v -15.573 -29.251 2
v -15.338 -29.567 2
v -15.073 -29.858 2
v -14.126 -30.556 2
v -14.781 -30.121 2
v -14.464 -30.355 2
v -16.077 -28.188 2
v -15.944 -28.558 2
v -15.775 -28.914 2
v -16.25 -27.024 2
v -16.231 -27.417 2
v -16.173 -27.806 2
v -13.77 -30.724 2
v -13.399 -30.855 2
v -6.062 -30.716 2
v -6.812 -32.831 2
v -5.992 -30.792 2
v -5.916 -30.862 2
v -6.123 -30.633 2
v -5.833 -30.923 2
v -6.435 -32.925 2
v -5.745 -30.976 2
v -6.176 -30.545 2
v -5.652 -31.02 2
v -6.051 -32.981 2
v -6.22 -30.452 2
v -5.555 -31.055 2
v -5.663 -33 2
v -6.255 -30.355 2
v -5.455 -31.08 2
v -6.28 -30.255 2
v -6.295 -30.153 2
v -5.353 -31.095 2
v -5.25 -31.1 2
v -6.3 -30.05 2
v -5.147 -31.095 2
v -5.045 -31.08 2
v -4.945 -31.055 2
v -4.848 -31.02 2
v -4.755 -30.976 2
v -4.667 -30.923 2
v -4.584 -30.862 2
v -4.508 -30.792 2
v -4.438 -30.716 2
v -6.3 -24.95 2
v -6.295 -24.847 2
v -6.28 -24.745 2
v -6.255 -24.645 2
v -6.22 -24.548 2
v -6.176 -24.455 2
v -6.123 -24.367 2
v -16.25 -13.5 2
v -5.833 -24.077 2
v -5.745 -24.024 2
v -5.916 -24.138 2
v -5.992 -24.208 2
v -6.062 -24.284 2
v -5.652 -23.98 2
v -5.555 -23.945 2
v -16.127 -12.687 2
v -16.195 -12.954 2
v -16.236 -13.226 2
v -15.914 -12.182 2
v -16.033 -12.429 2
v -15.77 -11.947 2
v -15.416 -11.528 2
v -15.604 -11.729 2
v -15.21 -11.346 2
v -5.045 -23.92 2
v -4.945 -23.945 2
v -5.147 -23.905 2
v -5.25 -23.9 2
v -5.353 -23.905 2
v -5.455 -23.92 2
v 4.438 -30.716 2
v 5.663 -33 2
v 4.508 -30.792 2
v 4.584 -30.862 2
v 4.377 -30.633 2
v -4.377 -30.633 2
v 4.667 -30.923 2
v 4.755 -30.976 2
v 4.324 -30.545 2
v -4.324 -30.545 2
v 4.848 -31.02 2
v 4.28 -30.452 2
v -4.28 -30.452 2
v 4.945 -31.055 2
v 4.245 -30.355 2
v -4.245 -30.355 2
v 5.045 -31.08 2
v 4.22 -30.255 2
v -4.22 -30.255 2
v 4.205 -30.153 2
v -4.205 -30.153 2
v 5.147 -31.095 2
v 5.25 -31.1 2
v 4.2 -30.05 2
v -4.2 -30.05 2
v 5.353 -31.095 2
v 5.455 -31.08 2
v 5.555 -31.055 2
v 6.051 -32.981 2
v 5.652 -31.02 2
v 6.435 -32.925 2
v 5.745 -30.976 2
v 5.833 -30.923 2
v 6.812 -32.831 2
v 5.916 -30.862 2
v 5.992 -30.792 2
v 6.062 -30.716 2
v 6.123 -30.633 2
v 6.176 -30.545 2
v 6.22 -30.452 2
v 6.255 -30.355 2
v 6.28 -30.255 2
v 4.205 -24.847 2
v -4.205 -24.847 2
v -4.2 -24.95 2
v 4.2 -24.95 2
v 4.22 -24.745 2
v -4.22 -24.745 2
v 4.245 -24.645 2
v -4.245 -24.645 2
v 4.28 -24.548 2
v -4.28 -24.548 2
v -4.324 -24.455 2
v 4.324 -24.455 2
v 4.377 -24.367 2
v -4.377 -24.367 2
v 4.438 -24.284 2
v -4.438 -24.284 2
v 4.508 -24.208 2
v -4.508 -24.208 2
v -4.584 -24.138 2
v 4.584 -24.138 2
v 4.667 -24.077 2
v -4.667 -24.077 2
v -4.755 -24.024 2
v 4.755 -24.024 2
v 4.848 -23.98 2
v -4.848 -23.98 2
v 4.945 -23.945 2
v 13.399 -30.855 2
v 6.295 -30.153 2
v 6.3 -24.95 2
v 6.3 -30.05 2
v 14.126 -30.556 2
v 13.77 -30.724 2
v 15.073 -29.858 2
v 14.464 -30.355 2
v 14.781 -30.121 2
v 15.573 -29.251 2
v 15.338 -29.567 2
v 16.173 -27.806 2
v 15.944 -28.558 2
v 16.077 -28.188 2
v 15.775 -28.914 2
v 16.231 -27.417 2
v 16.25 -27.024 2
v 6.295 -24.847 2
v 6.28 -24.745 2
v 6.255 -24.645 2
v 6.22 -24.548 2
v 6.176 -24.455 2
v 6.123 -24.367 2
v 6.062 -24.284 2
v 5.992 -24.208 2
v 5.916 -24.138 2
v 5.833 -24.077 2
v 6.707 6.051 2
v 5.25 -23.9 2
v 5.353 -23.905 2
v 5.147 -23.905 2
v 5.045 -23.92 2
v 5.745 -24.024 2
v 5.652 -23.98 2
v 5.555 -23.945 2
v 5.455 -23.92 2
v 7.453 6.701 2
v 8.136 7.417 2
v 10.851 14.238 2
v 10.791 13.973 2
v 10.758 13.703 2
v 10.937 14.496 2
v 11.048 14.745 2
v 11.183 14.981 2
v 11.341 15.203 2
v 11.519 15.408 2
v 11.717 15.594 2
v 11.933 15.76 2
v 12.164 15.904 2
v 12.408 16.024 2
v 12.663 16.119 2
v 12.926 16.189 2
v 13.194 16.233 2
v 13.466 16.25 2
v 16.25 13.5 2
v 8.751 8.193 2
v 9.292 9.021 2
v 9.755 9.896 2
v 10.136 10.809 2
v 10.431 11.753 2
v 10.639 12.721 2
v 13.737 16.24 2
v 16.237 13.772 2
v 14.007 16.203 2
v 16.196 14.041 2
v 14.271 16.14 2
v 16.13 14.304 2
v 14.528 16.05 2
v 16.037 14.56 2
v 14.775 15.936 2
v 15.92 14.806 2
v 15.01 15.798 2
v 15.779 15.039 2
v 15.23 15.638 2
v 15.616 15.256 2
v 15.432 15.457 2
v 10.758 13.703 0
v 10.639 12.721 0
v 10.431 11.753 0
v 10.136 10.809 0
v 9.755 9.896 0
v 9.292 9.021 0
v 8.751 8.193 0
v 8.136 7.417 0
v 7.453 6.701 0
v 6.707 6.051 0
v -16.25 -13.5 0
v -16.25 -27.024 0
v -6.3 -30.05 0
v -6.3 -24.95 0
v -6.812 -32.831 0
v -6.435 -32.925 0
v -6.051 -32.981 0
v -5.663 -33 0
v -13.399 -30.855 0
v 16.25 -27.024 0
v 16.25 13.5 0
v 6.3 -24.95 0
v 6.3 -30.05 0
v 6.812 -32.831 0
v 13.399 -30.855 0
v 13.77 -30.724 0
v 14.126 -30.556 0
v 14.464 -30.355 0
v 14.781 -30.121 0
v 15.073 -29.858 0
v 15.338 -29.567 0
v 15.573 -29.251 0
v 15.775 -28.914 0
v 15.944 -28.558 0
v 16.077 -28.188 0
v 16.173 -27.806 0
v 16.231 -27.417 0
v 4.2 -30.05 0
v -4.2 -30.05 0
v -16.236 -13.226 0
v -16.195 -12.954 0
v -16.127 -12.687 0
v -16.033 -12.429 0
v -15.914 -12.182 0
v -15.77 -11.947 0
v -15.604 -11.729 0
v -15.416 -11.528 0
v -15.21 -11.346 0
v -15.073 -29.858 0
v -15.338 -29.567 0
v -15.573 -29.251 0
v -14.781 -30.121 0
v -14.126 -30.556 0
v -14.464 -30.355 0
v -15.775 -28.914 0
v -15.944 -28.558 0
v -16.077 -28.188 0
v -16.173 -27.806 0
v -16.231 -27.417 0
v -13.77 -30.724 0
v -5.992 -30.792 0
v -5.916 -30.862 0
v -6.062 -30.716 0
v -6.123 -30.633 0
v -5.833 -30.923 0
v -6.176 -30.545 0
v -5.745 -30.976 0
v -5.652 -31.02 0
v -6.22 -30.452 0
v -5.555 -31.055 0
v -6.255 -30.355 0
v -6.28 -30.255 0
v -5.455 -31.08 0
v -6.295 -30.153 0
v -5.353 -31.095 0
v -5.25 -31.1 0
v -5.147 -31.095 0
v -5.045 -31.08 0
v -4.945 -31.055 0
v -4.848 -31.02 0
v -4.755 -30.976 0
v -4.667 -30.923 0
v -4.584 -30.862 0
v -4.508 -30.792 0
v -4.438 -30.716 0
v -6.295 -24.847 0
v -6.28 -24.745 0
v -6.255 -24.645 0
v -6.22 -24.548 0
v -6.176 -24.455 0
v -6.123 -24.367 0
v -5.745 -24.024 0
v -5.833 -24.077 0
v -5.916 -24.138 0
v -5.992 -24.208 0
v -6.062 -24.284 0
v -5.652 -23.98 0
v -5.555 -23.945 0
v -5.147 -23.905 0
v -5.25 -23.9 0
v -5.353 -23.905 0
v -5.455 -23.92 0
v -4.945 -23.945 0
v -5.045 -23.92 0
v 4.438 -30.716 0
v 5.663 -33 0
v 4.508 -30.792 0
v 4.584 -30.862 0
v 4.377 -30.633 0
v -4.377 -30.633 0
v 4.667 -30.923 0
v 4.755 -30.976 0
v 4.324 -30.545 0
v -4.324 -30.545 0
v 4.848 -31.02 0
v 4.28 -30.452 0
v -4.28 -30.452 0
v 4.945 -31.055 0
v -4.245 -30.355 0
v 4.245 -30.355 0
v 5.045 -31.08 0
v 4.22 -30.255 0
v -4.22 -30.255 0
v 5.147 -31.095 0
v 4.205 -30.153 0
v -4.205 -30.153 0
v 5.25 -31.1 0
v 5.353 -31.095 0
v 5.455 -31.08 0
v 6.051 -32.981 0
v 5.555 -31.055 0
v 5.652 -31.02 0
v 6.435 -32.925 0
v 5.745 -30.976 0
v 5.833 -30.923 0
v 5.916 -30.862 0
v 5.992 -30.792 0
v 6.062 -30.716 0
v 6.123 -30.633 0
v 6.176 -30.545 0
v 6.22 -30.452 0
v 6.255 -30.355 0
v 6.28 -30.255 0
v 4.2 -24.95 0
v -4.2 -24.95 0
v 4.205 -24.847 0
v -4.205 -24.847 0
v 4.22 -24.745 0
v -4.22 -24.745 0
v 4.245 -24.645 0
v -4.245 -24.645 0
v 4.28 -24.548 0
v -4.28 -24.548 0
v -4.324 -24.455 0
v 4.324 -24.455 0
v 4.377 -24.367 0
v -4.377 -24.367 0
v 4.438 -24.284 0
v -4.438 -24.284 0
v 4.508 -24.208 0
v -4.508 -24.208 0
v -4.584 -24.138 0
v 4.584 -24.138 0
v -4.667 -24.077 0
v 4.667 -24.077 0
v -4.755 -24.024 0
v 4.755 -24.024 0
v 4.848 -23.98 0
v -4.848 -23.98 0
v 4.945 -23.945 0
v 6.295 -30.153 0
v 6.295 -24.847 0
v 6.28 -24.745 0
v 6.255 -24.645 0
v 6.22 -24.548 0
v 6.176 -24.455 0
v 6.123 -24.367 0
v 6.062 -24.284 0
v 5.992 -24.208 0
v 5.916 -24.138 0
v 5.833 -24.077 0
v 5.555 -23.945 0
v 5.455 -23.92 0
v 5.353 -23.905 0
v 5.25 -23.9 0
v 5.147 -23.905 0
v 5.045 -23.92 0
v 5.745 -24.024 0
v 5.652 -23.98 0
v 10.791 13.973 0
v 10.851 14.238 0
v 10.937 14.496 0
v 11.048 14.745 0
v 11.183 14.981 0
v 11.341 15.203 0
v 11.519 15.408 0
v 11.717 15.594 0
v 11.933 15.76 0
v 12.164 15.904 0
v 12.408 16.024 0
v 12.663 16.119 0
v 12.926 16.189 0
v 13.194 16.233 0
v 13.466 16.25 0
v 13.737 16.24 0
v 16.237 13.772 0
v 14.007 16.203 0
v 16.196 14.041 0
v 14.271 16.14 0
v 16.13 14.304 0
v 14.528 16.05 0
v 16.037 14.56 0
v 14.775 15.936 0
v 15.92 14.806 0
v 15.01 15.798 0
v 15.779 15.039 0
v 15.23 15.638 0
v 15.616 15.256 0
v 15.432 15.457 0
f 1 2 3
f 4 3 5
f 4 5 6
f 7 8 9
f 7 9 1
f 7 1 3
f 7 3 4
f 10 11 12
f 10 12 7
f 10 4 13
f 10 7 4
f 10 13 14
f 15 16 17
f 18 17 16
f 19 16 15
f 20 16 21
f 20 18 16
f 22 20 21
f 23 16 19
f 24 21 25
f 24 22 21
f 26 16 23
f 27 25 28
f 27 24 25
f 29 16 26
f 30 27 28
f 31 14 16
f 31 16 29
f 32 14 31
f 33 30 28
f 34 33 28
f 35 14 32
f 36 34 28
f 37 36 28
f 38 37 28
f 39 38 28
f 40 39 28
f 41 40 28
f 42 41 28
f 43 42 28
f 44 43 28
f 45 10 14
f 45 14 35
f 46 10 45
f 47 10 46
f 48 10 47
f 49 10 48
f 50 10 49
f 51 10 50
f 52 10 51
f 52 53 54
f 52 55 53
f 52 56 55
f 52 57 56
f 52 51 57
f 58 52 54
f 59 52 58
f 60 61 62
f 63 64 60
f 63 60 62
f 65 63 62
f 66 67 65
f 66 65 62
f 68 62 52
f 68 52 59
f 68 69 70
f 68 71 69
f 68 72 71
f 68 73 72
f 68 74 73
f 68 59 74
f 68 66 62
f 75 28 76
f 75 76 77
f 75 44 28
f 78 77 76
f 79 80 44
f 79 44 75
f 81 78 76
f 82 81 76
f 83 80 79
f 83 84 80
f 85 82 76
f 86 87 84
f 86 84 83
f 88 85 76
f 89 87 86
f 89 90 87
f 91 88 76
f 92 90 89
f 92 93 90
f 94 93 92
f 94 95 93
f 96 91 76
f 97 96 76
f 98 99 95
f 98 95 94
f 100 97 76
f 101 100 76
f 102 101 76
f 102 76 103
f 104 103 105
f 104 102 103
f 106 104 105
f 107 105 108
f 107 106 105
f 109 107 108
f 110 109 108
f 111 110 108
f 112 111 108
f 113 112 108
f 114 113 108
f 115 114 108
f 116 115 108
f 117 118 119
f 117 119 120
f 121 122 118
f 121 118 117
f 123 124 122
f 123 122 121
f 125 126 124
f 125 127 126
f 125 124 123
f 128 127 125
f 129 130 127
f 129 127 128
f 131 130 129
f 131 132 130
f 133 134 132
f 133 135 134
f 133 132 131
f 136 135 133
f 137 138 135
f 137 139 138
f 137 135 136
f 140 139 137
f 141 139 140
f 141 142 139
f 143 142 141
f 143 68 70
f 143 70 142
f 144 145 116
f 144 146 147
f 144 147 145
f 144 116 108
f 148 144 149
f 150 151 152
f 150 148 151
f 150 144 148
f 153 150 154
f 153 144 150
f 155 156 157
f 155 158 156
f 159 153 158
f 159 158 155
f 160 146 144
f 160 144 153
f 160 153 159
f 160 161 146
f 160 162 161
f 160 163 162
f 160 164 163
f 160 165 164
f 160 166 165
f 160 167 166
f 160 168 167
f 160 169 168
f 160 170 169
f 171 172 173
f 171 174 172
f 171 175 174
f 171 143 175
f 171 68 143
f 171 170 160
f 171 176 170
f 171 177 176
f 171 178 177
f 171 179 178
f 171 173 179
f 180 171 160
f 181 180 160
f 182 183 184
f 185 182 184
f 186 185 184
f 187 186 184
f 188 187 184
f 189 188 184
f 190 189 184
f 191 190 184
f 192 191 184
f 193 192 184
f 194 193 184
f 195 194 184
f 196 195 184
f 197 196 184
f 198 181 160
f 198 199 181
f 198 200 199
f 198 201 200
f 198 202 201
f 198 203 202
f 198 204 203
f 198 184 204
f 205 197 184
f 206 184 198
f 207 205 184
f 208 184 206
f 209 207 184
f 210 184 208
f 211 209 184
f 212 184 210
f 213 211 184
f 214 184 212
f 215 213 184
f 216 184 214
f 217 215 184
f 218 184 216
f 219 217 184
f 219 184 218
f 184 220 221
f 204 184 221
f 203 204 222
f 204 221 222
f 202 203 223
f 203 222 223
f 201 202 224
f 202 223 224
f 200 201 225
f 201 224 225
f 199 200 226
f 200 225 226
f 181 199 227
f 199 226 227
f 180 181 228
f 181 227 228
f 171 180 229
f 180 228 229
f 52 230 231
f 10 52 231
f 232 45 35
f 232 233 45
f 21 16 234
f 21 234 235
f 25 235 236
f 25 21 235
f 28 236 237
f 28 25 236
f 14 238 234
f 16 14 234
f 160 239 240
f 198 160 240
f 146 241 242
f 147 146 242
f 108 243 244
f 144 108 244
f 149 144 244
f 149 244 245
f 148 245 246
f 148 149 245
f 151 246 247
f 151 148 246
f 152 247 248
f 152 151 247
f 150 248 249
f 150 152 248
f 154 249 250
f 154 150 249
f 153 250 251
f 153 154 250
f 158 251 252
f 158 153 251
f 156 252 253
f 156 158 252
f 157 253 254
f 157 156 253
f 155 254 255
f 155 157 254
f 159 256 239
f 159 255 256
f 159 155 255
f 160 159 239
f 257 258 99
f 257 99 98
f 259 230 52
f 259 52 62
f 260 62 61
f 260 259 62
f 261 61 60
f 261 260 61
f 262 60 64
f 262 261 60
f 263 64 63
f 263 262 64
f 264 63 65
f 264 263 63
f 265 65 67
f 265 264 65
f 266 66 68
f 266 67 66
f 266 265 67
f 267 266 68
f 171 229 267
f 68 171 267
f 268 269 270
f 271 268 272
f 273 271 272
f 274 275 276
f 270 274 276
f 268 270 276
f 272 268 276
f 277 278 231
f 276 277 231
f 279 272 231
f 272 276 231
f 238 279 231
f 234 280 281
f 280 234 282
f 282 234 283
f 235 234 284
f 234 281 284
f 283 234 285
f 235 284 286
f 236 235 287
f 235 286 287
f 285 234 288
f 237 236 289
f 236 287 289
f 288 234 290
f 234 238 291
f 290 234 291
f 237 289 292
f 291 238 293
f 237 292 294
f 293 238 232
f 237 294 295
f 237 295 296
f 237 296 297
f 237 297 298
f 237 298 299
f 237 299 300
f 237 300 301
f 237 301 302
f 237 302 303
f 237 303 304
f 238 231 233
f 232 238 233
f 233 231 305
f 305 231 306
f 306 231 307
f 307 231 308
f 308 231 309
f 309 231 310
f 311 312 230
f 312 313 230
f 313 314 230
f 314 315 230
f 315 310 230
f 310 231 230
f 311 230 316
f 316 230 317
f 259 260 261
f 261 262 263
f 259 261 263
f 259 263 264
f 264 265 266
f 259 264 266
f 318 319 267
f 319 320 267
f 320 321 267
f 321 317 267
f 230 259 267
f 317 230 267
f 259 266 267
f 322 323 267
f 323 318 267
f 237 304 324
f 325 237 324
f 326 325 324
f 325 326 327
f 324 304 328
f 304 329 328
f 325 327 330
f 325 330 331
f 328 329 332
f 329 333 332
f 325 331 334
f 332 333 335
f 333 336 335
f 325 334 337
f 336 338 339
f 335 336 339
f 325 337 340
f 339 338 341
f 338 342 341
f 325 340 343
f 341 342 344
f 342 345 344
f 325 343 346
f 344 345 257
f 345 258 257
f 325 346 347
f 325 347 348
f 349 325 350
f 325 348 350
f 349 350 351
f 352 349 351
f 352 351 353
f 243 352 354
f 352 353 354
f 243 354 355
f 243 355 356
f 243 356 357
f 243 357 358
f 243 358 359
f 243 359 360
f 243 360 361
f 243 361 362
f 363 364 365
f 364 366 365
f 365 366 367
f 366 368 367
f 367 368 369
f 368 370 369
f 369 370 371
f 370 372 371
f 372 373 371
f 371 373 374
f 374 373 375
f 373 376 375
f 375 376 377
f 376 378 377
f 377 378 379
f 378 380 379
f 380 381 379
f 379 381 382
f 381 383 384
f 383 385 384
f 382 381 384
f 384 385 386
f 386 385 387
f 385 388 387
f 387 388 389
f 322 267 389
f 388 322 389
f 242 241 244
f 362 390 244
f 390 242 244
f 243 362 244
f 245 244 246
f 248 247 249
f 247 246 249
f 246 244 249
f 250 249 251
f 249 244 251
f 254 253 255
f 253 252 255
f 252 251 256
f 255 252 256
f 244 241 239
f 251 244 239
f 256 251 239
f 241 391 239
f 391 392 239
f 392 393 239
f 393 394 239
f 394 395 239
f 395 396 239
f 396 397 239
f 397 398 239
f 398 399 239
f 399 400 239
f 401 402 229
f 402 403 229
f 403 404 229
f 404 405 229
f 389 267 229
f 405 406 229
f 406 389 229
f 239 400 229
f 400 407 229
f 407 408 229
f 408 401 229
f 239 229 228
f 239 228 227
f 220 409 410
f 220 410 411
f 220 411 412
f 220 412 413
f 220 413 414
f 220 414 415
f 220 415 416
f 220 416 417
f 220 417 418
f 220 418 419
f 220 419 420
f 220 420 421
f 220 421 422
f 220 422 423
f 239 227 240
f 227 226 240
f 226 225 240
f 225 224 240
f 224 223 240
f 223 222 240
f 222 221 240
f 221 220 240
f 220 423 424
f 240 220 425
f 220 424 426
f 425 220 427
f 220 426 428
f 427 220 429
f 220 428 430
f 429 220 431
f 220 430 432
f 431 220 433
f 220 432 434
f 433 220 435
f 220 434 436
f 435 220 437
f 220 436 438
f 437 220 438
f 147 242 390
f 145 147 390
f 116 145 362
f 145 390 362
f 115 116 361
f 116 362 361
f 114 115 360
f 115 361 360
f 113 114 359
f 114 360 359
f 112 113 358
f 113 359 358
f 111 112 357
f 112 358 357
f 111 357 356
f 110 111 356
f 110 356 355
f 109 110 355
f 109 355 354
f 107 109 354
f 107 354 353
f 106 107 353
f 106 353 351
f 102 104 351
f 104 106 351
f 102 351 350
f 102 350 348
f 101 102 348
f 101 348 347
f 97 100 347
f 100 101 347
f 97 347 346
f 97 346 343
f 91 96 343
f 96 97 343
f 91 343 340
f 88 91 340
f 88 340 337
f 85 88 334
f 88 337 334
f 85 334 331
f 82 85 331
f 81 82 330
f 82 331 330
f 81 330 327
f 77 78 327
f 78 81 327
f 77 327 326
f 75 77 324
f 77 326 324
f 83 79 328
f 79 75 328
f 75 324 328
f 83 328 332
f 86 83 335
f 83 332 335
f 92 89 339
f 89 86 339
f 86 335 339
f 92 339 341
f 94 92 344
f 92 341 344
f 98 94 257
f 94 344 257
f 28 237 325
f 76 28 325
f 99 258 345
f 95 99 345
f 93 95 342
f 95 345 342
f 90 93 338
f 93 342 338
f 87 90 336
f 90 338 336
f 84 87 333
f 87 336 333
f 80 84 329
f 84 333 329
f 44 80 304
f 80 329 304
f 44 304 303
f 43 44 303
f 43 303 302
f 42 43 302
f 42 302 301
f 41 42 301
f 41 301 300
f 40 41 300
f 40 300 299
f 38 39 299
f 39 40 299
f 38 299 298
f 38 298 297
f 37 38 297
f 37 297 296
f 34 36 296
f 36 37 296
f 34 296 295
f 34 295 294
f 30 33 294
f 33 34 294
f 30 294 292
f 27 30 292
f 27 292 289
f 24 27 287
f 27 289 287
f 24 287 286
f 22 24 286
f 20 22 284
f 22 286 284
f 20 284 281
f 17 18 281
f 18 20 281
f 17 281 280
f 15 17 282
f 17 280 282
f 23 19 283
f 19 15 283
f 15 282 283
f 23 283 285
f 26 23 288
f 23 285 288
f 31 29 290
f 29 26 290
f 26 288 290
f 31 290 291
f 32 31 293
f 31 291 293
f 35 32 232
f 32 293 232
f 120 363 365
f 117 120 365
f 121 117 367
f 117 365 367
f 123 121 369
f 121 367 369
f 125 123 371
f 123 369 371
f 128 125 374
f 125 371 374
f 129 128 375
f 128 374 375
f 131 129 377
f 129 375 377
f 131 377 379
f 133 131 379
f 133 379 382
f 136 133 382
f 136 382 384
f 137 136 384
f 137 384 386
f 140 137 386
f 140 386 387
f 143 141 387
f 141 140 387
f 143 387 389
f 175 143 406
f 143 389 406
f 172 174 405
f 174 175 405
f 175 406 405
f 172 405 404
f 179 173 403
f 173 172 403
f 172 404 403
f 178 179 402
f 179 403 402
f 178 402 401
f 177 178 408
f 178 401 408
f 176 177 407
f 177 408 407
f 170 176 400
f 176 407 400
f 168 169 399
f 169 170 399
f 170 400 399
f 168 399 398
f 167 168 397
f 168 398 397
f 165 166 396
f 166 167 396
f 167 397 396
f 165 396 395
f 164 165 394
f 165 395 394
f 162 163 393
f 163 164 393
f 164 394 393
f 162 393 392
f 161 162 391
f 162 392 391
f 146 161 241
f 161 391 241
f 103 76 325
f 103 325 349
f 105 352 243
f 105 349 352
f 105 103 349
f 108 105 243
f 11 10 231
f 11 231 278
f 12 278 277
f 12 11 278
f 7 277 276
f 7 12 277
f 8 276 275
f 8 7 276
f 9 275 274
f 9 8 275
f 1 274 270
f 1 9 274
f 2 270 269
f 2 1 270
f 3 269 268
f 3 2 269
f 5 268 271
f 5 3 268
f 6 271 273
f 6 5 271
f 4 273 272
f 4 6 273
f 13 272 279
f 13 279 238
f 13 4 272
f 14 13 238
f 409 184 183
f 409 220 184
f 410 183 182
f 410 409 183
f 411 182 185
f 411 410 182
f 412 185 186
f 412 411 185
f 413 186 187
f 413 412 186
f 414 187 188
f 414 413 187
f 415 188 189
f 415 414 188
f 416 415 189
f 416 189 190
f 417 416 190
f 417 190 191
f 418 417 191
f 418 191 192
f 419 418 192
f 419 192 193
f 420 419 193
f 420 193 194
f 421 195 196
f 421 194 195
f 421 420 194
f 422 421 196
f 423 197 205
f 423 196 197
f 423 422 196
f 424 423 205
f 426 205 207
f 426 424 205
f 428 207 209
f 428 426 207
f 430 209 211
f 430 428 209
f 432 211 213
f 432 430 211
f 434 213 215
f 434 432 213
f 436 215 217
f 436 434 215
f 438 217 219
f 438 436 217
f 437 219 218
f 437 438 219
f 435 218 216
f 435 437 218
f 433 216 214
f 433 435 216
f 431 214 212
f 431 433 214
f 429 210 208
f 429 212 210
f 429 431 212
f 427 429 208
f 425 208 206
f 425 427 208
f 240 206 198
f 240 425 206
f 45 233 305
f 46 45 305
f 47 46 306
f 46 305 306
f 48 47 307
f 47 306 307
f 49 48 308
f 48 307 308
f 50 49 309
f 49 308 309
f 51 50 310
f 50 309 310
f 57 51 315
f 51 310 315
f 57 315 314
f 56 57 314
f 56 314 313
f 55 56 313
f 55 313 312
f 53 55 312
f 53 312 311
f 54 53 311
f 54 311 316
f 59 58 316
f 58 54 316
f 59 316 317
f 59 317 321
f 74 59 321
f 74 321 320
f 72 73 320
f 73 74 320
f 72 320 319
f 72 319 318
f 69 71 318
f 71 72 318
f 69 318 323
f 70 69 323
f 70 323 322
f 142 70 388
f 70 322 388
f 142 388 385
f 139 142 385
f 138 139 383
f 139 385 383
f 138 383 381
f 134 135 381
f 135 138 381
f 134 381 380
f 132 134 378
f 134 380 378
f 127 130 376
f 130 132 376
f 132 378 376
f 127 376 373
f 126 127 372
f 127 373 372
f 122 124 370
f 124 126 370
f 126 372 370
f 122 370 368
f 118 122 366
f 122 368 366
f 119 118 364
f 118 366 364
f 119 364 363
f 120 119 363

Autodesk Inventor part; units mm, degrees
ref_plane "YZ Plane" through (0, 0, 0) normal (1, 0, 0) x (0, 1, 0)
ref_plane "XZ Plane" through (0, 0, 0) normal (0, 1, 0) x (-1, 0, 0)
ref_plane "XY Plane" through (0, 0, 0) normal (0, 0, 1) x (1, 0, 0)
sketch "スケッチ1" plane through (0, 0, 0) normal (0, 0, 1) x (1, 0, 0)
  line L0 (-13.5, 13.5) -> (13.5, 13.5) construction
  line L1 (13.5, 13.5) -> (13.5, -13.5) construction
  line L2 (13.5, -13.5) -> (-13.5, -13.5) construction
  line L3 (-13.5, -13.5) -> (-13.5, 13.5) construction
  circle A0 centre (-13.5, 13.5) radius 1.35
  circle A1 centre (13.5, 13.5) radius 1.35
  circle A2 centre (-13.5, -13.5) radius 1.35
  circle A3 centre (13.5, -13.5) radius 1.35
  circle A4 centre (0, 14.5) radius 10.5 construction
  line L4 (-6.25, -25) -> (6.25, -25) construction
  line L5 (6.25, -25) -> (6.25, -30) construction
  line L6 (6.25, -30) -> (-6.25, -30) construction
  line L7 (-6.25, -30) -> (-6.25, -25) construction
  line L8 (-16.25, -25) -> (16.25, -25) construction
  line L9 (16.25, -25) -> (16.25, -30) construction
  line L10 (16.25, -30) -> (-16.25, -30) construction
  line L11 (-16.25, -30) -> (-16.25, -25) construction
  line L12 (-6.3, -24.95) -> (6.3, -24.95) construction
  line L13 (6.3, -24.95) -> (6.3, -30.05) construction
  line L14 (6.3, -30.05) -> (-6.3, -30.05) construction
  line L15 (-6.3, -30.05) -> (-6.3, -24.95) construction
  circle A5 centre (-5.25, -24.95) radius 1.05 construction
  circle A6 centre (-11.25, -27.5) radius 1.55
  circle A7 centre (11.25, -27.5) radius 1.55
  line L16 (0, 0) -> (0, -13.5) construction
  line L17 (-6.3, -24.95) -> (-6.3, -30.05)
  line L18 (6.3, -27.5) -> (-6.3, -27.5) construction
  line L19 (0, -25) -> (0, -30.05) construction
  arc A8 (-4.2, -24.95) -> (-6.3, -24.95) centre (-5.25, -24.95) ccw
  arc A9 (-6.3, -30.05) -> (-4.2, -30.05) centre (-5.25, -30.05) ccw
  line L20 (-4.2, -24.95) -> (4.2, -24.95)
  line L21 (-4.2, -30.05) -> (4.2, -30.05)
  arc A10 (6.3, -24.95) -> (4.2, -24.95) centre (5.25, -24.95) ccw
  arc A11 (4.2, -30.05) -> (6.3, -30.05) centre (5.25, -30.05) ccw
  line L22 (6.3, -24.95) -> (6.3, -30.05)
  circle A12 centre (-13.5, -13.5) radius 2.75 construction
  circle A13 centre (13.5, 13.5) radius 2.75 construction
  line L23 (-16.25, -13.5) -> (-16.25, -30)
  line L24 (-16.25, -30) -> (-6.25, -33)
  line L25 (-6.25, -33) -> (6.25, -33)
  line L26 (6.25, -33) -> (16.25, -30)
  line L27 (16.25, -30) -> (16.25, 13.5)
  arc A14 (16.25, 13.5) -> (10.7575, 13.7031) centre (13.5, 13.5) ccw
  arc A15 (6.7066, 6.0513) -> (10.7575, 13.7031) centre (0, 14.5) ccw
  line L28 (6.7066, 6.0513) -> (-15.2098, -11.3461)
  arc A16 (-15.2098, -11.3461) -> (-16.25, -13.5) centre (-13.5, -13.5) ccw
  line L29 (-10.75, -14.1897) -> (-10.75, -22)
  line L30 (-10.75, -22) -> (10.75, -22)
  line L31 (10.75, -22) -> (10.75, 2.8772)
  line L32 (10.75, 2.8772) -> (-10.75, -14.1897)
  point P0 (0, 13.5)
  point P1 (13.5, 0)
  point P2 (-16.25, -27.5)
  dimension "d23" = 2.1
  dimension "d0" = 27
  dimension "d3" = 27
  dimension "d6" = 27
  dimension "d9" = 2.7
  dimension "d10" = 21
  dimension "d11" = 1
  dimension "d12" = 11.5
  dimension "d13" = 5
  dimension "d16" = 32.5
  dimension "d20" = 10
  dimension "d22" = 0.05
  dimension "d24" = 5
  dimension "d26" = 3.1
  dimension "d31" = 5.5
  dimension "d32" = 3
  dimension "d33" = 5
  dimension "d34" = 3
extrude "押し出し1" add sketch "スケッチ1" along normal blind 2 contours A16 L28 A15 A14 L27 L26 L25 L24 L23 | L32 L31 L30 L29
fillet "フィレット1" radius 4 4 edges at (16.25, -30, 1) (-16.25, -30, 1) (-6.25, -33, 1) (6.25, -33, 1)
sketch "スケッチ2" plane through (0, 0, 2) normal (0, 0, 1) x (1, 0, 0)
  circle A0 centre (-13.5, -13.5) radius 1.35 projected
  circle A1 centre (-13.5, -13.5) radius 1.35
  circle A2 centre (13.5, -13.5) radius 1.35 projected
  circle A3 centre (13.5, -13.5) radius 1.35
  circle A4 centre (11.25, -27.5) radius 1.55 projected
  circle A5 centre (11.25, -27.5) radius 1.55
  circle A6 centre (-11.25, -27.5) radius 1.55 projected
  circle A7 centre (-11.25, -27.5) radius 1.55
  circle A8 centre (13.5, 13.5) radius 1.35 projected
  circle A9 centre (13.5, 13.5) radius 1.35
  point P0 (0, 0)
extrude "押し出し2" add sketch "スケッチ2" against normal up to surface (2 mm away)
equation "\"d3\" = d0"
equation "\"d6\" = d0"
equation "\"d16\" = d0_1"
equation "\"d20\" = d3_1"
equation "\"d24\" = d17"
equation "\"d34\" = d32"
equation "\"d0_1\" = 32.5"
equation "\"d3_1\" = 10"
equation "\"d17\" = 5"
properties part number "上腕_サブフレーム_1_1" material "GFRP"
